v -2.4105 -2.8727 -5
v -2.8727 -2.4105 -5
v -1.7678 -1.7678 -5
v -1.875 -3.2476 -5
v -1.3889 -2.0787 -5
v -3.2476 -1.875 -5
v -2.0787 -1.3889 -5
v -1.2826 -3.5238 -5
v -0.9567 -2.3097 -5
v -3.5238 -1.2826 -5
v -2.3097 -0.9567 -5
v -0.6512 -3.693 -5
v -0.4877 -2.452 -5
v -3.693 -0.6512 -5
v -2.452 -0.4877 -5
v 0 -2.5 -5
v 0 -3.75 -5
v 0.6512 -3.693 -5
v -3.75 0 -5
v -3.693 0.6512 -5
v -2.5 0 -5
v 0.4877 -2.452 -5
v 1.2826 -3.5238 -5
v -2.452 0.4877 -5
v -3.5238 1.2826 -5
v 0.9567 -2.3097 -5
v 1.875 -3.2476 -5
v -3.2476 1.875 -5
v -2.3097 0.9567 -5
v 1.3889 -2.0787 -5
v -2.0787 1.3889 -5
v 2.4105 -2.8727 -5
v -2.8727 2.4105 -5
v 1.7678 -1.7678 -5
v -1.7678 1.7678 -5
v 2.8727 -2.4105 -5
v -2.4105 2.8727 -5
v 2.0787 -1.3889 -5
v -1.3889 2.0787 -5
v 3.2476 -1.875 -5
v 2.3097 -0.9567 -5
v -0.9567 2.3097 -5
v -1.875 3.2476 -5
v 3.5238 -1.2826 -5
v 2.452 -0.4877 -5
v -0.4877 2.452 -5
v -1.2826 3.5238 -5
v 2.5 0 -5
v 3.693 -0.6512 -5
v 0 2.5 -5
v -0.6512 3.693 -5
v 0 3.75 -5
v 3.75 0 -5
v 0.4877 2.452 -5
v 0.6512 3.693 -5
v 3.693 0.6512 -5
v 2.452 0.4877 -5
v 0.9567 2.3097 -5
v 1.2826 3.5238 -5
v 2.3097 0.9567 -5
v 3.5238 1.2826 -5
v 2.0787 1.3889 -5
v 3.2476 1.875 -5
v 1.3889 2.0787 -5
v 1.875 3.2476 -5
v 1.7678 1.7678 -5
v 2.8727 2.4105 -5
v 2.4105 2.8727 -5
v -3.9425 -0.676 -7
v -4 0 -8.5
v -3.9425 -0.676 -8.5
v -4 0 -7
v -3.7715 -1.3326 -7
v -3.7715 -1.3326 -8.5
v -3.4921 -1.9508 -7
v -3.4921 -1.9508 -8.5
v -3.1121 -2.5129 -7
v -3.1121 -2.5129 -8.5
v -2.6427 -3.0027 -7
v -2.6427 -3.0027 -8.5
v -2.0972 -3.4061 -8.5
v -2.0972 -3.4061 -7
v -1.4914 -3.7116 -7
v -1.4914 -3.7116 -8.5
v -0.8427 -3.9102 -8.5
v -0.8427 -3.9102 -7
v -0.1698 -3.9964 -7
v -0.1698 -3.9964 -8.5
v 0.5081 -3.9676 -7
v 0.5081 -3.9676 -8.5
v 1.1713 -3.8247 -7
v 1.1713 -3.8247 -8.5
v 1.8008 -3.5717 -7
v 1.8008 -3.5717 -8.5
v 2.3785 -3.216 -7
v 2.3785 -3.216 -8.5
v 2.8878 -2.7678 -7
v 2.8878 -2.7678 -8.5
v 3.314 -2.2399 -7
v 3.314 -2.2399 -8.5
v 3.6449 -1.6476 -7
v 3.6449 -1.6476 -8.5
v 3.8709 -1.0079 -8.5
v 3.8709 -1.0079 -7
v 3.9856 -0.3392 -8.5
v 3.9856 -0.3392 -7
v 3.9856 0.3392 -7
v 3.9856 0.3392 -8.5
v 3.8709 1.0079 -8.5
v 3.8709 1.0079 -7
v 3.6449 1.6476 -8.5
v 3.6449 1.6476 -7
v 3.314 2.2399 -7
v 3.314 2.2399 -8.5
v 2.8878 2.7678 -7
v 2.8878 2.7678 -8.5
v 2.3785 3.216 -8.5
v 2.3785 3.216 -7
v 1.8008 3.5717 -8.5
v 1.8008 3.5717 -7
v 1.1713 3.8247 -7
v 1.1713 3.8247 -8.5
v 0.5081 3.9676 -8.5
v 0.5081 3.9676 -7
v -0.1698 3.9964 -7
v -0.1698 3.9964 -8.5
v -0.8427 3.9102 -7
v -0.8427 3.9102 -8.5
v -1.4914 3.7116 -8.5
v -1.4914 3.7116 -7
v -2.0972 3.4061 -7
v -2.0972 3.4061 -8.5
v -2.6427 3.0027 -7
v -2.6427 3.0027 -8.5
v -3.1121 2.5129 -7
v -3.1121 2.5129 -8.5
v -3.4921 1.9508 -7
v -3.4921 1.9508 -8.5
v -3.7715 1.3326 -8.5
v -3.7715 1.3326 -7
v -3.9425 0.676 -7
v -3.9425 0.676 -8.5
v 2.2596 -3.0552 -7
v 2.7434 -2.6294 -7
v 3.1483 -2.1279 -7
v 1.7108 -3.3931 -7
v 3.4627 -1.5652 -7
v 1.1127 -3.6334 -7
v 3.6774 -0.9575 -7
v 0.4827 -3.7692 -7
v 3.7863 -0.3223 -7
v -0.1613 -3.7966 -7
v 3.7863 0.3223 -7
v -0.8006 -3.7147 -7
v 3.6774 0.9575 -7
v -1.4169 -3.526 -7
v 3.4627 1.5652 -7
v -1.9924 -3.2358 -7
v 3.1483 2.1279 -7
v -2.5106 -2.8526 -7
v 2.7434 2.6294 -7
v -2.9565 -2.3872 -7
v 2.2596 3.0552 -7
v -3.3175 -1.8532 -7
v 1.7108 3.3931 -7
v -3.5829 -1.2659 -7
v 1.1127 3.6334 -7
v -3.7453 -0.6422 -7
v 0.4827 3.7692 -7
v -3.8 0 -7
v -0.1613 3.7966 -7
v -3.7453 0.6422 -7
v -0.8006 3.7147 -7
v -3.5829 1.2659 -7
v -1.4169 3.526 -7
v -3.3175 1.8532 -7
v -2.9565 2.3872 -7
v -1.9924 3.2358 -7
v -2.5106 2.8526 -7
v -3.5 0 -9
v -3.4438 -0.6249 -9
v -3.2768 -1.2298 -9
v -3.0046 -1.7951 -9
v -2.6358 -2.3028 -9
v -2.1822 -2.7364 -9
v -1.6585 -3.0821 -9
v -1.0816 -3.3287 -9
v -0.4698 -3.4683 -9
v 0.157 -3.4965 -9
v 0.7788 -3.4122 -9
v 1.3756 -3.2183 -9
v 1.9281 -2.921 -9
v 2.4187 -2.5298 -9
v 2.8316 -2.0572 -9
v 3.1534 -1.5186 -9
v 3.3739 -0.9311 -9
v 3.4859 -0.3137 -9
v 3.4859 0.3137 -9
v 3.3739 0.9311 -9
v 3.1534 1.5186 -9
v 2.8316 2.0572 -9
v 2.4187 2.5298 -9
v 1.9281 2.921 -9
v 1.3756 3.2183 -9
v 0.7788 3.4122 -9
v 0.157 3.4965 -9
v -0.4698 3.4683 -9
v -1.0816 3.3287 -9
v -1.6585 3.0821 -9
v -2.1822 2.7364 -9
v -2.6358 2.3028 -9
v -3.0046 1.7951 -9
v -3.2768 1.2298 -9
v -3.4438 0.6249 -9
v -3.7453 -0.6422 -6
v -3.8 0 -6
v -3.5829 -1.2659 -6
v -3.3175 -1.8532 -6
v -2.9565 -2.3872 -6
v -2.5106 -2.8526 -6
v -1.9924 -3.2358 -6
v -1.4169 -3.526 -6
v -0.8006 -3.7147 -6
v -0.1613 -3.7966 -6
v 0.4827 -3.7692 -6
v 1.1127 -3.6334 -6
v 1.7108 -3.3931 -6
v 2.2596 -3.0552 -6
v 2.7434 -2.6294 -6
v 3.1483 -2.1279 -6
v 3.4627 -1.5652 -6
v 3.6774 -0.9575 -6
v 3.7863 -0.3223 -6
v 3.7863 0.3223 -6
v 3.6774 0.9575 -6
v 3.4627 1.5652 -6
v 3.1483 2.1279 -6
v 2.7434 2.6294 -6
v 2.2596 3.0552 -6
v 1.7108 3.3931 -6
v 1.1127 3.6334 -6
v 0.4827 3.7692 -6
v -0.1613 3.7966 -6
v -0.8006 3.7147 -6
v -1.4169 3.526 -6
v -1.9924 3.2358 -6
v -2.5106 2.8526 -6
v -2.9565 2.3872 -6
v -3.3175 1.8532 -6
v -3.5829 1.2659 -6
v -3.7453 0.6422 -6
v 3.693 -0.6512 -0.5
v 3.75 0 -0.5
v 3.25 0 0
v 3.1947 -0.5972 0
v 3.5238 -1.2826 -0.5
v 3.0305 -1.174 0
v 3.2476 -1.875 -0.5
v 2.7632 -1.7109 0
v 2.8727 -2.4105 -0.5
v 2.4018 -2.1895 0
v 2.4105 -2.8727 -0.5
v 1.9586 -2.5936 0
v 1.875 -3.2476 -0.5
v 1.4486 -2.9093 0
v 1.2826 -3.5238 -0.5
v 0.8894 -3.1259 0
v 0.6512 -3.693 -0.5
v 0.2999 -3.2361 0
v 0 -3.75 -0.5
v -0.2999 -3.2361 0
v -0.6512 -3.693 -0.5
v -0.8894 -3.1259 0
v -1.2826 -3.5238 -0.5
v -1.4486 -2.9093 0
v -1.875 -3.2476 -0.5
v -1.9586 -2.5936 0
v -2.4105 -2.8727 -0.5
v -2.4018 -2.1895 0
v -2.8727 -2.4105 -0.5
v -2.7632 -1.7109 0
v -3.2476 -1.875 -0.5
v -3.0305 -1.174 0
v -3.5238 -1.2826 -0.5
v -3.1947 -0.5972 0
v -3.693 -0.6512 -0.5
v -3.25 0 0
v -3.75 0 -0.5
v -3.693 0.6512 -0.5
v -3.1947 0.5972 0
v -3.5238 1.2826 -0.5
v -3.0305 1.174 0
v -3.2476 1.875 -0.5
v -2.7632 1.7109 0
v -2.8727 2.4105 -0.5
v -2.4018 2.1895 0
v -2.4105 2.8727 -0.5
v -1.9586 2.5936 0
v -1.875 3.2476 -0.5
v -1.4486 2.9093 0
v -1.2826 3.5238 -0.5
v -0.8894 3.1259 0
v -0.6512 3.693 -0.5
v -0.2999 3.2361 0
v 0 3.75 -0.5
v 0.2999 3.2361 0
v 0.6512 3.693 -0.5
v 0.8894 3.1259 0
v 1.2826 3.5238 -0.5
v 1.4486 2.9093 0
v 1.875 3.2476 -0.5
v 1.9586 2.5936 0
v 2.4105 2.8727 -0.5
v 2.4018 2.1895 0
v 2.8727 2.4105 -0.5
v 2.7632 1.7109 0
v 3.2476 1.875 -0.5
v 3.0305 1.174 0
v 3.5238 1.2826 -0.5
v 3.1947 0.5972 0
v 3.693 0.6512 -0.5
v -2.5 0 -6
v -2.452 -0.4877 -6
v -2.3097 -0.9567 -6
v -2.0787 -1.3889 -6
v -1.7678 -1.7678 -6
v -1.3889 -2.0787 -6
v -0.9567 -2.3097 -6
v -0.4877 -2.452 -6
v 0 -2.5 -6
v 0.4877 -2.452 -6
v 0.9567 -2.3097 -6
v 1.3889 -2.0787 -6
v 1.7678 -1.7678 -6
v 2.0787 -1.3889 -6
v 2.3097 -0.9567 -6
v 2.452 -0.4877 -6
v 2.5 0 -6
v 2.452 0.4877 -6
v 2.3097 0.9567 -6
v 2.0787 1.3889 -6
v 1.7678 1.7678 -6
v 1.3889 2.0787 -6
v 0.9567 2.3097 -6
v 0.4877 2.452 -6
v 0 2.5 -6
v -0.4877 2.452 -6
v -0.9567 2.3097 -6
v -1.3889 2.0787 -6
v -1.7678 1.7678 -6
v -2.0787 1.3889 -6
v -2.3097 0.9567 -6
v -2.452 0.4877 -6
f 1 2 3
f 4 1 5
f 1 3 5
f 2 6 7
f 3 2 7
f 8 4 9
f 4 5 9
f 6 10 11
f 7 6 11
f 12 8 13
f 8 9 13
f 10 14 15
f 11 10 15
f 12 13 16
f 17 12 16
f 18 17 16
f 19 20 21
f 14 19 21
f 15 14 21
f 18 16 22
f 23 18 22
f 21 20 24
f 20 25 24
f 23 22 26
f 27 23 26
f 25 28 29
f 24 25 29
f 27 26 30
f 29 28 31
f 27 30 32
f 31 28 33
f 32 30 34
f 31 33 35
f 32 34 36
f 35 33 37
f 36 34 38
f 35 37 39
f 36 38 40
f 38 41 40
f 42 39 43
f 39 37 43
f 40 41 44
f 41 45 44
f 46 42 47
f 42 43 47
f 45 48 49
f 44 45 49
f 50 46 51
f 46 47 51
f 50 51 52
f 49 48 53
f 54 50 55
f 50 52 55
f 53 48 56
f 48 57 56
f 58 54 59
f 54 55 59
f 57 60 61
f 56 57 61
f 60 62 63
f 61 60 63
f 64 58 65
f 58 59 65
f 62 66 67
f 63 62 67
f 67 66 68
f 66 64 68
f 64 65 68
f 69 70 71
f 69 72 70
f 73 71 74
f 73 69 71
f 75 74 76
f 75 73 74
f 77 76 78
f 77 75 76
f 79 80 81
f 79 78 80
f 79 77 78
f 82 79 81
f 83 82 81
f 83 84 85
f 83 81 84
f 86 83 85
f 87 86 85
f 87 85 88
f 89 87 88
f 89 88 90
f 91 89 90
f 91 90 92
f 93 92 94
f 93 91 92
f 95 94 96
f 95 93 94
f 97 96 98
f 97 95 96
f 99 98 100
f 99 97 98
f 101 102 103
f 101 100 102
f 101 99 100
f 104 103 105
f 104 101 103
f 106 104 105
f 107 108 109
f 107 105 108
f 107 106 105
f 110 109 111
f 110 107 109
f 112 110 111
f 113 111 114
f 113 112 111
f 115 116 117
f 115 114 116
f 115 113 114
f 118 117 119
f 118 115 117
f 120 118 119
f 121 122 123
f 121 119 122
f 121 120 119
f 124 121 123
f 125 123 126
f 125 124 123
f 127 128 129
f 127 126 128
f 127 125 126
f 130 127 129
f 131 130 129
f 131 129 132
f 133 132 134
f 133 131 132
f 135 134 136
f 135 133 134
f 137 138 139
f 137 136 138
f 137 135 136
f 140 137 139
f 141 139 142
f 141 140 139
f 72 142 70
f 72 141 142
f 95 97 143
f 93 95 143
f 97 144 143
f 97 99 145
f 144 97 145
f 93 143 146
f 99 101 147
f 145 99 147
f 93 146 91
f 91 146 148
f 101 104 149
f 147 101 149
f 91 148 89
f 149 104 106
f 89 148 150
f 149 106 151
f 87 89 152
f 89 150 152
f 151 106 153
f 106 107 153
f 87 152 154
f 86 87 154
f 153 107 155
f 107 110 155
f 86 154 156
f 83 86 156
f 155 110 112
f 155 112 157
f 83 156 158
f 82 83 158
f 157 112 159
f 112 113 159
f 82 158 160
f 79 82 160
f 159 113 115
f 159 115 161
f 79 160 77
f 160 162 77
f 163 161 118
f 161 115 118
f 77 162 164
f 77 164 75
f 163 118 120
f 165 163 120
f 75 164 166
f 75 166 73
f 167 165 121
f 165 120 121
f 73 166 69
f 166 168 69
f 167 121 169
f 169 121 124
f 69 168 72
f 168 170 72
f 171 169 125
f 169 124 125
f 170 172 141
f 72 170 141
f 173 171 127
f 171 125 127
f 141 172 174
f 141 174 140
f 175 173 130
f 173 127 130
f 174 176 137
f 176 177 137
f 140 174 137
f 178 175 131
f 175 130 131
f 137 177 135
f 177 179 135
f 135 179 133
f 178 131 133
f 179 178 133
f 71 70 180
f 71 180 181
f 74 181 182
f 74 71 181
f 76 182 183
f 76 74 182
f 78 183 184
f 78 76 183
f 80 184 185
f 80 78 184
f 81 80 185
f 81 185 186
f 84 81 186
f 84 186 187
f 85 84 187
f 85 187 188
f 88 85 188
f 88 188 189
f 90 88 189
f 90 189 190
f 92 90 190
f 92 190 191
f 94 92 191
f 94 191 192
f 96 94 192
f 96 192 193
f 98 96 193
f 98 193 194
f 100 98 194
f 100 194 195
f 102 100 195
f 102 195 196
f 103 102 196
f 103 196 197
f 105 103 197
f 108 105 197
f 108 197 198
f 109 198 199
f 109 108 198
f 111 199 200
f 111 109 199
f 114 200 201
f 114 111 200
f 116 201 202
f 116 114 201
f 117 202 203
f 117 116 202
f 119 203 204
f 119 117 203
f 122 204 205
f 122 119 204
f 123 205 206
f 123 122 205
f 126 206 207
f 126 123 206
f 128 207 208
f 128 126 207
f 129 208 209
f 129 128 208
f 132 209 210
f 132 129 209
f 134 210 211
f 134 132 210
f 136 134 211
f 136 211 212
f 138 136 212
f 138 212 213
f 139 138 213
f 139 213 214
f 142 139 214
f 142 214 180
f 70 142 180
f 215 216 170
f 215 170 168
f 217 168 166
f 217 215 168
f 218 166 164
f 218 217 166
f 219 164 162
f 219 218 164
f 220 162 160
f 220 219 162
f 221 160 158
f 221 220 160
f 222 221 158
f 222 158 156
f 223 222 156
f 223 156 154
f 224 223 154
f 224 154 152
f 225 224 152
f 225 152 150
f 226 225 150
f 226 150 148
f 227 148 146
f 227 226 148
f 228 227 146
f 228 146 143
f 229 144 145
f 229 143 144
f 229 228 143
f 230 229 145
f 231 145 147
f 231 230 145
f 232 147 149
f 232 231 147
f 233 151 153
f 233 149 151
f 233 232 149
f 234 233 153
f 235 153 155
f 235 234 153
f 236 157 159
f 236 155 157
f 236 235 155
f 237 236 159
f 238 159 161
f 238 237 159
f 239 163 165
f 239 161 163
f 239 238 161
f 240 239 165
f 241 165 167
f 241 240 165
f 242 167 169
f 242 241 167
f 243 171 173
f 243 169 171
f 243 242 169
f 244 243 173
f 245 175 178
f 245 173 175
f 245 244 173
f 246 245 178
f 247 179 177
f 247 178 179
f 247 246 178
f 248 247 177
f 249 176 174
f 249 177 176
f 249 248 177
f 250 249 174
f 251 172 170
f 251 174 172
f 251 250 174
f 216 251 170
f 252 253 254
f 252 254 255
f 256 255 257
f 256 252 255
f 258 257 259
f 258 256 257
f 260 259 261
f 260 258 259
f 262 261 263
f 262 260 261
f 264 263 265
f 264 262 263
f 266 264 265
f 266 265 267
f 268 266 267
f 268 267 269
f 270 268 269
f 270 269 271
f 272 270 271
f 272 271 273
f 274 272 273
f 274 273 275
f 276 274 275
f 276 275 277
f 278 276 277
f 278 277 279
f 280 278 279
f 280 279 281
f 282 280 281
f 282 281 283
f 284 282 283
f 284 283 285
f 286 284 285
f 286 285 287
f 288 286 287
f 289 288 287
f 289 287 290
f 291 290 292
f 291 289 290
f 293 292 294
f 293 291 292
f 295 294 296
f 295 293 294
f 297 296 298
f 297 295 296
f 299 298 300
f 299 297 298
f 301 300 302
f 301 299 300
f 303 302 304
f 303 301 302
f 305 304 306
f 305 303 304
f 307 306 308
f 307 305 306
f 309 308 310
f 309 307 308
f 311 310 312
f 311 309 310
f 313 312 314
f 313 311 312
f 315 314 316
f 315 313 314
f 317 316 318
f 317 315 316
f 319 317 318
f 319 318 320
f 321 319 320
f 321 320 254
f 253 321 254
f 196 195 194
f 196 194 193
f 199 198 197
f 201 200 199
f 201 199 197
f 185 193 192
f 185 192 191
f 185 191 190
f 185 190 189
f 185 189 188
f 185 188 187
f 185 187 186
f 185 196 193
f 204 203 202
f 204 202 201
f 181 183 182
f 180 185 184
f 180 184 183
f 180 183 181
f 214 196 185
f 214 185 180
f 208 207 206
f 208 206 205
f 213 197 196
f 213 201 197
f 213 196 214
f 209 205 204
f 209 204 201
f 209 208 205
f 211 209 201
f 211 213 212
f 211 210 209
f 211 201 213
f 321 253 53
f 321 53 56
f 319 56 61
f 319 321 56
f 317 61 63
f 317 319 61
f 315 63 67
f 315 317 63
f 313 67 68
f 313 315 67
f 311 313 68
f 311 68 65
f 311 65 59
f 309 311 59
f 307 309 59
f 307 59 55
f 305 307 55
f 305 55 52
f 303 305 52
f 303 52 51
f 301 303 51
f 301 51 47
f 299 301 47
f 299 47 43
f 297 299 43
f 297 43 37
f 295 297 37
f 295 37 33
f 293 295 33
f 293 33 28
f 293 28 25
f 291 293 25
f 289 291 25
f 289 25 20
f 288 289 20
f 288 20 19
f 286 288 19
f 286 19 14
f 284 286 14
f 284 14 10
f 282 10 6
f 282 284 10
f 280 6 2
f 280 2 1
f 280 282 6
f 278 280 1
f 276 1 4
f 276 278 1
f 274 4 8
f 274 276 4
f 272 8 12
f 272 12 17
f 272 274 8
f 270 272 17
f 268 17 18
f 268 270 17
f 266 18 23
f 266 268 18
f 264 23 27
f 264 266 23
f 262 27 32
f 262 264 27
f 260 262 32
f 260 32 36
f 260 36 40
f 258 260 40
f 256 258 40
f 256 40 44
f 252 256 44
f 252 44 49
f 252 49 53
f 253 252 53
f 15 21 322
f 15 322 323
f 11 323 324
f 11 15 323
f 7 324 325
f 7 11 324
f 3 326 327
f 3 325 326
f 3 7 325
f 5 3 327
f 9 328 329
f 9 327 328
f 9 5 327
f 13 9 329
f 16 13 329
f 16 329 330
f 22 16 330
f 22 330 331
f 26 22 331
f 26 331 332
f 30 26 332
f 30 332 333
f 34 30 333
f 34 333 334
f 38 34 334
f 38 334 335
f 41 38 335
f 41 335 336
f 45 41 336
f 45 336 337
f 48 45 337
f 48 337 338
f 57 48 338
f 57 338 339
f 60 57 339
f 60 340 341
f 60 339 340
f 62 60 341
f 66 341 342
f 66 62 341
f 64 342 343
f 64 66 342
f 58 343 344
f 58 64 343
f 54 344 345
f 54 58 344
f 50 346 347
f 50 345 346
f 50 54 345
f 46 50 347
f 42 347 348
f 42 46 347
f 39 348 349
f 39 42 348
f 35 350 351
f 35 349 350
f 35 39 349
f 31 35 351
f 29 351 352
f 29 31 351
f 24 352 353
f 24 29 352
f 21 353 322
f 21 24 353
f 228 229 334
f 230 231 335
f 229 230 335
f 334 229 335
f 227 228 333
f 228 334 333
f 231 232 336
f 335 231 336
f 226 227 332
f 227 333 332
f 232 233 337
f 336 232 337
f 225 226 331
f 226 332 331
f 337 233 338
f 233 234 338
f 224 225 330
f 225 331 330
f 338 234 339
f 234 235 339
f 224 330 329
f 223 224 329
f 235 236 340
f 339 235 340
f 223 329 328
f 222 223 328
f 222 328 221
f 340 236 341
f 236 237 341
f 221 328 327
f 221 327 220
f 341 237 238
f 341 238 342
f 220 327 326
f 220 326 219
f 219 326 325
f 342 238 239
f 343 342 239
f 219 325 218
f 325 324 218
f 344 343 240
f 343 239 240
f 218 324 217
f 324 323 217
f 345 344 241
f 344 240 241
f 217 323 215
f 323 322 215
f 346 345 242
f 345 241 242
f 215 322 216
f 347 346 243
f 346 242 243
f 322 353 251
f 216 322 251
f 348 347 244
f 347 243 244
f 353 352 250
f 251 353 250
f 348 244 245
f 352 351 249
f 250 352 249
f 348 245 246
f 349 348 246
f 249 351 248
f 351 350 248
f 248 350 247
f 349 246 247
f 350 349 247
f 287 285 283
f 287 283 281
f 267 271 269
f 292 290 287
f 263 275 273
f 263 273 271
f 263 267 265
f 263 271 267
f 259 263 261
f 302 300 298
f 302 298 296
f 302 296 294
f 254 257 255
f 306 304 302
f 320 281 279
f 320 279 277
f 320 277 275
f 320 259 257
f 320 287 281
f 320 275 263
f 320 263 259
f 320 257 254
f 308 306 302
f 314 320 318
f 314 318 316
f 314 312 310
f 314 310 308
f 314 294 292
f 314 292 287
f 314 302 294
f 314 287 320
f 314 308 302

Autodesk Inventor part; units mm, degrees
ref_plane "YZ Plane" through (0, 0, 0) normal (1, 0, 0) x (0, 1, 0)
ref_plane "XZ Plane" through (0, 0, 0) normal (0, 1, 0) x (-1, 0, 0)
ref_plane "XY Plane" through (0, 0, 0) normal (0, 0, 1) x (1, 0, 0)
sketch "Sketch1" plane through (0, 0, 0) normal (0, 0, 1) x (1, 0, 0)
  circle A0 centre (0, 0) radius 3.75
  dimension "d0" = 7.5
extrude "Extrusion1" add sketch "Sketch1" against normal blind 5
chamfer "Chamfer1" distance 0.5 angle 45 1 edges at (-3.75, 0, 0) measured on face at (3.7014, -0.6015, -3.3333)
sketch "Sketch2" plane through (0, 0, -5) normal (0, 0, -1) x (-1, 0, 0)
  circle A0 centre (0, 0) radius 2.5
  dimension "d6" = 5
extrude "Extrusion2" add sketch "Sketch2" along normal blind 1
sketch "Sketch3" plane through (0, 0, -6) normal (0, 0, -1) x (-1, 0, 0)
  circle A0 centre (0, 0) radius 3.8
  dimension "d9" = 7.6
extrude "Extrusion3" add sketch "Sketch3" along normal blind 1
sketch "Sketch4" plane through (0, 0, -7) normal (0, 0, -1) x (-1, 0, 0)
  circle A0 centre (0, 0) radius 4
extrude "Extrusion4" add sketch "Sketch4" along normal blind 2
chamfer "Chamfer2" distance 0.5 angle 45 1 edges at (4, 0, -9)
properties part number "Bolt" material "Steel"
